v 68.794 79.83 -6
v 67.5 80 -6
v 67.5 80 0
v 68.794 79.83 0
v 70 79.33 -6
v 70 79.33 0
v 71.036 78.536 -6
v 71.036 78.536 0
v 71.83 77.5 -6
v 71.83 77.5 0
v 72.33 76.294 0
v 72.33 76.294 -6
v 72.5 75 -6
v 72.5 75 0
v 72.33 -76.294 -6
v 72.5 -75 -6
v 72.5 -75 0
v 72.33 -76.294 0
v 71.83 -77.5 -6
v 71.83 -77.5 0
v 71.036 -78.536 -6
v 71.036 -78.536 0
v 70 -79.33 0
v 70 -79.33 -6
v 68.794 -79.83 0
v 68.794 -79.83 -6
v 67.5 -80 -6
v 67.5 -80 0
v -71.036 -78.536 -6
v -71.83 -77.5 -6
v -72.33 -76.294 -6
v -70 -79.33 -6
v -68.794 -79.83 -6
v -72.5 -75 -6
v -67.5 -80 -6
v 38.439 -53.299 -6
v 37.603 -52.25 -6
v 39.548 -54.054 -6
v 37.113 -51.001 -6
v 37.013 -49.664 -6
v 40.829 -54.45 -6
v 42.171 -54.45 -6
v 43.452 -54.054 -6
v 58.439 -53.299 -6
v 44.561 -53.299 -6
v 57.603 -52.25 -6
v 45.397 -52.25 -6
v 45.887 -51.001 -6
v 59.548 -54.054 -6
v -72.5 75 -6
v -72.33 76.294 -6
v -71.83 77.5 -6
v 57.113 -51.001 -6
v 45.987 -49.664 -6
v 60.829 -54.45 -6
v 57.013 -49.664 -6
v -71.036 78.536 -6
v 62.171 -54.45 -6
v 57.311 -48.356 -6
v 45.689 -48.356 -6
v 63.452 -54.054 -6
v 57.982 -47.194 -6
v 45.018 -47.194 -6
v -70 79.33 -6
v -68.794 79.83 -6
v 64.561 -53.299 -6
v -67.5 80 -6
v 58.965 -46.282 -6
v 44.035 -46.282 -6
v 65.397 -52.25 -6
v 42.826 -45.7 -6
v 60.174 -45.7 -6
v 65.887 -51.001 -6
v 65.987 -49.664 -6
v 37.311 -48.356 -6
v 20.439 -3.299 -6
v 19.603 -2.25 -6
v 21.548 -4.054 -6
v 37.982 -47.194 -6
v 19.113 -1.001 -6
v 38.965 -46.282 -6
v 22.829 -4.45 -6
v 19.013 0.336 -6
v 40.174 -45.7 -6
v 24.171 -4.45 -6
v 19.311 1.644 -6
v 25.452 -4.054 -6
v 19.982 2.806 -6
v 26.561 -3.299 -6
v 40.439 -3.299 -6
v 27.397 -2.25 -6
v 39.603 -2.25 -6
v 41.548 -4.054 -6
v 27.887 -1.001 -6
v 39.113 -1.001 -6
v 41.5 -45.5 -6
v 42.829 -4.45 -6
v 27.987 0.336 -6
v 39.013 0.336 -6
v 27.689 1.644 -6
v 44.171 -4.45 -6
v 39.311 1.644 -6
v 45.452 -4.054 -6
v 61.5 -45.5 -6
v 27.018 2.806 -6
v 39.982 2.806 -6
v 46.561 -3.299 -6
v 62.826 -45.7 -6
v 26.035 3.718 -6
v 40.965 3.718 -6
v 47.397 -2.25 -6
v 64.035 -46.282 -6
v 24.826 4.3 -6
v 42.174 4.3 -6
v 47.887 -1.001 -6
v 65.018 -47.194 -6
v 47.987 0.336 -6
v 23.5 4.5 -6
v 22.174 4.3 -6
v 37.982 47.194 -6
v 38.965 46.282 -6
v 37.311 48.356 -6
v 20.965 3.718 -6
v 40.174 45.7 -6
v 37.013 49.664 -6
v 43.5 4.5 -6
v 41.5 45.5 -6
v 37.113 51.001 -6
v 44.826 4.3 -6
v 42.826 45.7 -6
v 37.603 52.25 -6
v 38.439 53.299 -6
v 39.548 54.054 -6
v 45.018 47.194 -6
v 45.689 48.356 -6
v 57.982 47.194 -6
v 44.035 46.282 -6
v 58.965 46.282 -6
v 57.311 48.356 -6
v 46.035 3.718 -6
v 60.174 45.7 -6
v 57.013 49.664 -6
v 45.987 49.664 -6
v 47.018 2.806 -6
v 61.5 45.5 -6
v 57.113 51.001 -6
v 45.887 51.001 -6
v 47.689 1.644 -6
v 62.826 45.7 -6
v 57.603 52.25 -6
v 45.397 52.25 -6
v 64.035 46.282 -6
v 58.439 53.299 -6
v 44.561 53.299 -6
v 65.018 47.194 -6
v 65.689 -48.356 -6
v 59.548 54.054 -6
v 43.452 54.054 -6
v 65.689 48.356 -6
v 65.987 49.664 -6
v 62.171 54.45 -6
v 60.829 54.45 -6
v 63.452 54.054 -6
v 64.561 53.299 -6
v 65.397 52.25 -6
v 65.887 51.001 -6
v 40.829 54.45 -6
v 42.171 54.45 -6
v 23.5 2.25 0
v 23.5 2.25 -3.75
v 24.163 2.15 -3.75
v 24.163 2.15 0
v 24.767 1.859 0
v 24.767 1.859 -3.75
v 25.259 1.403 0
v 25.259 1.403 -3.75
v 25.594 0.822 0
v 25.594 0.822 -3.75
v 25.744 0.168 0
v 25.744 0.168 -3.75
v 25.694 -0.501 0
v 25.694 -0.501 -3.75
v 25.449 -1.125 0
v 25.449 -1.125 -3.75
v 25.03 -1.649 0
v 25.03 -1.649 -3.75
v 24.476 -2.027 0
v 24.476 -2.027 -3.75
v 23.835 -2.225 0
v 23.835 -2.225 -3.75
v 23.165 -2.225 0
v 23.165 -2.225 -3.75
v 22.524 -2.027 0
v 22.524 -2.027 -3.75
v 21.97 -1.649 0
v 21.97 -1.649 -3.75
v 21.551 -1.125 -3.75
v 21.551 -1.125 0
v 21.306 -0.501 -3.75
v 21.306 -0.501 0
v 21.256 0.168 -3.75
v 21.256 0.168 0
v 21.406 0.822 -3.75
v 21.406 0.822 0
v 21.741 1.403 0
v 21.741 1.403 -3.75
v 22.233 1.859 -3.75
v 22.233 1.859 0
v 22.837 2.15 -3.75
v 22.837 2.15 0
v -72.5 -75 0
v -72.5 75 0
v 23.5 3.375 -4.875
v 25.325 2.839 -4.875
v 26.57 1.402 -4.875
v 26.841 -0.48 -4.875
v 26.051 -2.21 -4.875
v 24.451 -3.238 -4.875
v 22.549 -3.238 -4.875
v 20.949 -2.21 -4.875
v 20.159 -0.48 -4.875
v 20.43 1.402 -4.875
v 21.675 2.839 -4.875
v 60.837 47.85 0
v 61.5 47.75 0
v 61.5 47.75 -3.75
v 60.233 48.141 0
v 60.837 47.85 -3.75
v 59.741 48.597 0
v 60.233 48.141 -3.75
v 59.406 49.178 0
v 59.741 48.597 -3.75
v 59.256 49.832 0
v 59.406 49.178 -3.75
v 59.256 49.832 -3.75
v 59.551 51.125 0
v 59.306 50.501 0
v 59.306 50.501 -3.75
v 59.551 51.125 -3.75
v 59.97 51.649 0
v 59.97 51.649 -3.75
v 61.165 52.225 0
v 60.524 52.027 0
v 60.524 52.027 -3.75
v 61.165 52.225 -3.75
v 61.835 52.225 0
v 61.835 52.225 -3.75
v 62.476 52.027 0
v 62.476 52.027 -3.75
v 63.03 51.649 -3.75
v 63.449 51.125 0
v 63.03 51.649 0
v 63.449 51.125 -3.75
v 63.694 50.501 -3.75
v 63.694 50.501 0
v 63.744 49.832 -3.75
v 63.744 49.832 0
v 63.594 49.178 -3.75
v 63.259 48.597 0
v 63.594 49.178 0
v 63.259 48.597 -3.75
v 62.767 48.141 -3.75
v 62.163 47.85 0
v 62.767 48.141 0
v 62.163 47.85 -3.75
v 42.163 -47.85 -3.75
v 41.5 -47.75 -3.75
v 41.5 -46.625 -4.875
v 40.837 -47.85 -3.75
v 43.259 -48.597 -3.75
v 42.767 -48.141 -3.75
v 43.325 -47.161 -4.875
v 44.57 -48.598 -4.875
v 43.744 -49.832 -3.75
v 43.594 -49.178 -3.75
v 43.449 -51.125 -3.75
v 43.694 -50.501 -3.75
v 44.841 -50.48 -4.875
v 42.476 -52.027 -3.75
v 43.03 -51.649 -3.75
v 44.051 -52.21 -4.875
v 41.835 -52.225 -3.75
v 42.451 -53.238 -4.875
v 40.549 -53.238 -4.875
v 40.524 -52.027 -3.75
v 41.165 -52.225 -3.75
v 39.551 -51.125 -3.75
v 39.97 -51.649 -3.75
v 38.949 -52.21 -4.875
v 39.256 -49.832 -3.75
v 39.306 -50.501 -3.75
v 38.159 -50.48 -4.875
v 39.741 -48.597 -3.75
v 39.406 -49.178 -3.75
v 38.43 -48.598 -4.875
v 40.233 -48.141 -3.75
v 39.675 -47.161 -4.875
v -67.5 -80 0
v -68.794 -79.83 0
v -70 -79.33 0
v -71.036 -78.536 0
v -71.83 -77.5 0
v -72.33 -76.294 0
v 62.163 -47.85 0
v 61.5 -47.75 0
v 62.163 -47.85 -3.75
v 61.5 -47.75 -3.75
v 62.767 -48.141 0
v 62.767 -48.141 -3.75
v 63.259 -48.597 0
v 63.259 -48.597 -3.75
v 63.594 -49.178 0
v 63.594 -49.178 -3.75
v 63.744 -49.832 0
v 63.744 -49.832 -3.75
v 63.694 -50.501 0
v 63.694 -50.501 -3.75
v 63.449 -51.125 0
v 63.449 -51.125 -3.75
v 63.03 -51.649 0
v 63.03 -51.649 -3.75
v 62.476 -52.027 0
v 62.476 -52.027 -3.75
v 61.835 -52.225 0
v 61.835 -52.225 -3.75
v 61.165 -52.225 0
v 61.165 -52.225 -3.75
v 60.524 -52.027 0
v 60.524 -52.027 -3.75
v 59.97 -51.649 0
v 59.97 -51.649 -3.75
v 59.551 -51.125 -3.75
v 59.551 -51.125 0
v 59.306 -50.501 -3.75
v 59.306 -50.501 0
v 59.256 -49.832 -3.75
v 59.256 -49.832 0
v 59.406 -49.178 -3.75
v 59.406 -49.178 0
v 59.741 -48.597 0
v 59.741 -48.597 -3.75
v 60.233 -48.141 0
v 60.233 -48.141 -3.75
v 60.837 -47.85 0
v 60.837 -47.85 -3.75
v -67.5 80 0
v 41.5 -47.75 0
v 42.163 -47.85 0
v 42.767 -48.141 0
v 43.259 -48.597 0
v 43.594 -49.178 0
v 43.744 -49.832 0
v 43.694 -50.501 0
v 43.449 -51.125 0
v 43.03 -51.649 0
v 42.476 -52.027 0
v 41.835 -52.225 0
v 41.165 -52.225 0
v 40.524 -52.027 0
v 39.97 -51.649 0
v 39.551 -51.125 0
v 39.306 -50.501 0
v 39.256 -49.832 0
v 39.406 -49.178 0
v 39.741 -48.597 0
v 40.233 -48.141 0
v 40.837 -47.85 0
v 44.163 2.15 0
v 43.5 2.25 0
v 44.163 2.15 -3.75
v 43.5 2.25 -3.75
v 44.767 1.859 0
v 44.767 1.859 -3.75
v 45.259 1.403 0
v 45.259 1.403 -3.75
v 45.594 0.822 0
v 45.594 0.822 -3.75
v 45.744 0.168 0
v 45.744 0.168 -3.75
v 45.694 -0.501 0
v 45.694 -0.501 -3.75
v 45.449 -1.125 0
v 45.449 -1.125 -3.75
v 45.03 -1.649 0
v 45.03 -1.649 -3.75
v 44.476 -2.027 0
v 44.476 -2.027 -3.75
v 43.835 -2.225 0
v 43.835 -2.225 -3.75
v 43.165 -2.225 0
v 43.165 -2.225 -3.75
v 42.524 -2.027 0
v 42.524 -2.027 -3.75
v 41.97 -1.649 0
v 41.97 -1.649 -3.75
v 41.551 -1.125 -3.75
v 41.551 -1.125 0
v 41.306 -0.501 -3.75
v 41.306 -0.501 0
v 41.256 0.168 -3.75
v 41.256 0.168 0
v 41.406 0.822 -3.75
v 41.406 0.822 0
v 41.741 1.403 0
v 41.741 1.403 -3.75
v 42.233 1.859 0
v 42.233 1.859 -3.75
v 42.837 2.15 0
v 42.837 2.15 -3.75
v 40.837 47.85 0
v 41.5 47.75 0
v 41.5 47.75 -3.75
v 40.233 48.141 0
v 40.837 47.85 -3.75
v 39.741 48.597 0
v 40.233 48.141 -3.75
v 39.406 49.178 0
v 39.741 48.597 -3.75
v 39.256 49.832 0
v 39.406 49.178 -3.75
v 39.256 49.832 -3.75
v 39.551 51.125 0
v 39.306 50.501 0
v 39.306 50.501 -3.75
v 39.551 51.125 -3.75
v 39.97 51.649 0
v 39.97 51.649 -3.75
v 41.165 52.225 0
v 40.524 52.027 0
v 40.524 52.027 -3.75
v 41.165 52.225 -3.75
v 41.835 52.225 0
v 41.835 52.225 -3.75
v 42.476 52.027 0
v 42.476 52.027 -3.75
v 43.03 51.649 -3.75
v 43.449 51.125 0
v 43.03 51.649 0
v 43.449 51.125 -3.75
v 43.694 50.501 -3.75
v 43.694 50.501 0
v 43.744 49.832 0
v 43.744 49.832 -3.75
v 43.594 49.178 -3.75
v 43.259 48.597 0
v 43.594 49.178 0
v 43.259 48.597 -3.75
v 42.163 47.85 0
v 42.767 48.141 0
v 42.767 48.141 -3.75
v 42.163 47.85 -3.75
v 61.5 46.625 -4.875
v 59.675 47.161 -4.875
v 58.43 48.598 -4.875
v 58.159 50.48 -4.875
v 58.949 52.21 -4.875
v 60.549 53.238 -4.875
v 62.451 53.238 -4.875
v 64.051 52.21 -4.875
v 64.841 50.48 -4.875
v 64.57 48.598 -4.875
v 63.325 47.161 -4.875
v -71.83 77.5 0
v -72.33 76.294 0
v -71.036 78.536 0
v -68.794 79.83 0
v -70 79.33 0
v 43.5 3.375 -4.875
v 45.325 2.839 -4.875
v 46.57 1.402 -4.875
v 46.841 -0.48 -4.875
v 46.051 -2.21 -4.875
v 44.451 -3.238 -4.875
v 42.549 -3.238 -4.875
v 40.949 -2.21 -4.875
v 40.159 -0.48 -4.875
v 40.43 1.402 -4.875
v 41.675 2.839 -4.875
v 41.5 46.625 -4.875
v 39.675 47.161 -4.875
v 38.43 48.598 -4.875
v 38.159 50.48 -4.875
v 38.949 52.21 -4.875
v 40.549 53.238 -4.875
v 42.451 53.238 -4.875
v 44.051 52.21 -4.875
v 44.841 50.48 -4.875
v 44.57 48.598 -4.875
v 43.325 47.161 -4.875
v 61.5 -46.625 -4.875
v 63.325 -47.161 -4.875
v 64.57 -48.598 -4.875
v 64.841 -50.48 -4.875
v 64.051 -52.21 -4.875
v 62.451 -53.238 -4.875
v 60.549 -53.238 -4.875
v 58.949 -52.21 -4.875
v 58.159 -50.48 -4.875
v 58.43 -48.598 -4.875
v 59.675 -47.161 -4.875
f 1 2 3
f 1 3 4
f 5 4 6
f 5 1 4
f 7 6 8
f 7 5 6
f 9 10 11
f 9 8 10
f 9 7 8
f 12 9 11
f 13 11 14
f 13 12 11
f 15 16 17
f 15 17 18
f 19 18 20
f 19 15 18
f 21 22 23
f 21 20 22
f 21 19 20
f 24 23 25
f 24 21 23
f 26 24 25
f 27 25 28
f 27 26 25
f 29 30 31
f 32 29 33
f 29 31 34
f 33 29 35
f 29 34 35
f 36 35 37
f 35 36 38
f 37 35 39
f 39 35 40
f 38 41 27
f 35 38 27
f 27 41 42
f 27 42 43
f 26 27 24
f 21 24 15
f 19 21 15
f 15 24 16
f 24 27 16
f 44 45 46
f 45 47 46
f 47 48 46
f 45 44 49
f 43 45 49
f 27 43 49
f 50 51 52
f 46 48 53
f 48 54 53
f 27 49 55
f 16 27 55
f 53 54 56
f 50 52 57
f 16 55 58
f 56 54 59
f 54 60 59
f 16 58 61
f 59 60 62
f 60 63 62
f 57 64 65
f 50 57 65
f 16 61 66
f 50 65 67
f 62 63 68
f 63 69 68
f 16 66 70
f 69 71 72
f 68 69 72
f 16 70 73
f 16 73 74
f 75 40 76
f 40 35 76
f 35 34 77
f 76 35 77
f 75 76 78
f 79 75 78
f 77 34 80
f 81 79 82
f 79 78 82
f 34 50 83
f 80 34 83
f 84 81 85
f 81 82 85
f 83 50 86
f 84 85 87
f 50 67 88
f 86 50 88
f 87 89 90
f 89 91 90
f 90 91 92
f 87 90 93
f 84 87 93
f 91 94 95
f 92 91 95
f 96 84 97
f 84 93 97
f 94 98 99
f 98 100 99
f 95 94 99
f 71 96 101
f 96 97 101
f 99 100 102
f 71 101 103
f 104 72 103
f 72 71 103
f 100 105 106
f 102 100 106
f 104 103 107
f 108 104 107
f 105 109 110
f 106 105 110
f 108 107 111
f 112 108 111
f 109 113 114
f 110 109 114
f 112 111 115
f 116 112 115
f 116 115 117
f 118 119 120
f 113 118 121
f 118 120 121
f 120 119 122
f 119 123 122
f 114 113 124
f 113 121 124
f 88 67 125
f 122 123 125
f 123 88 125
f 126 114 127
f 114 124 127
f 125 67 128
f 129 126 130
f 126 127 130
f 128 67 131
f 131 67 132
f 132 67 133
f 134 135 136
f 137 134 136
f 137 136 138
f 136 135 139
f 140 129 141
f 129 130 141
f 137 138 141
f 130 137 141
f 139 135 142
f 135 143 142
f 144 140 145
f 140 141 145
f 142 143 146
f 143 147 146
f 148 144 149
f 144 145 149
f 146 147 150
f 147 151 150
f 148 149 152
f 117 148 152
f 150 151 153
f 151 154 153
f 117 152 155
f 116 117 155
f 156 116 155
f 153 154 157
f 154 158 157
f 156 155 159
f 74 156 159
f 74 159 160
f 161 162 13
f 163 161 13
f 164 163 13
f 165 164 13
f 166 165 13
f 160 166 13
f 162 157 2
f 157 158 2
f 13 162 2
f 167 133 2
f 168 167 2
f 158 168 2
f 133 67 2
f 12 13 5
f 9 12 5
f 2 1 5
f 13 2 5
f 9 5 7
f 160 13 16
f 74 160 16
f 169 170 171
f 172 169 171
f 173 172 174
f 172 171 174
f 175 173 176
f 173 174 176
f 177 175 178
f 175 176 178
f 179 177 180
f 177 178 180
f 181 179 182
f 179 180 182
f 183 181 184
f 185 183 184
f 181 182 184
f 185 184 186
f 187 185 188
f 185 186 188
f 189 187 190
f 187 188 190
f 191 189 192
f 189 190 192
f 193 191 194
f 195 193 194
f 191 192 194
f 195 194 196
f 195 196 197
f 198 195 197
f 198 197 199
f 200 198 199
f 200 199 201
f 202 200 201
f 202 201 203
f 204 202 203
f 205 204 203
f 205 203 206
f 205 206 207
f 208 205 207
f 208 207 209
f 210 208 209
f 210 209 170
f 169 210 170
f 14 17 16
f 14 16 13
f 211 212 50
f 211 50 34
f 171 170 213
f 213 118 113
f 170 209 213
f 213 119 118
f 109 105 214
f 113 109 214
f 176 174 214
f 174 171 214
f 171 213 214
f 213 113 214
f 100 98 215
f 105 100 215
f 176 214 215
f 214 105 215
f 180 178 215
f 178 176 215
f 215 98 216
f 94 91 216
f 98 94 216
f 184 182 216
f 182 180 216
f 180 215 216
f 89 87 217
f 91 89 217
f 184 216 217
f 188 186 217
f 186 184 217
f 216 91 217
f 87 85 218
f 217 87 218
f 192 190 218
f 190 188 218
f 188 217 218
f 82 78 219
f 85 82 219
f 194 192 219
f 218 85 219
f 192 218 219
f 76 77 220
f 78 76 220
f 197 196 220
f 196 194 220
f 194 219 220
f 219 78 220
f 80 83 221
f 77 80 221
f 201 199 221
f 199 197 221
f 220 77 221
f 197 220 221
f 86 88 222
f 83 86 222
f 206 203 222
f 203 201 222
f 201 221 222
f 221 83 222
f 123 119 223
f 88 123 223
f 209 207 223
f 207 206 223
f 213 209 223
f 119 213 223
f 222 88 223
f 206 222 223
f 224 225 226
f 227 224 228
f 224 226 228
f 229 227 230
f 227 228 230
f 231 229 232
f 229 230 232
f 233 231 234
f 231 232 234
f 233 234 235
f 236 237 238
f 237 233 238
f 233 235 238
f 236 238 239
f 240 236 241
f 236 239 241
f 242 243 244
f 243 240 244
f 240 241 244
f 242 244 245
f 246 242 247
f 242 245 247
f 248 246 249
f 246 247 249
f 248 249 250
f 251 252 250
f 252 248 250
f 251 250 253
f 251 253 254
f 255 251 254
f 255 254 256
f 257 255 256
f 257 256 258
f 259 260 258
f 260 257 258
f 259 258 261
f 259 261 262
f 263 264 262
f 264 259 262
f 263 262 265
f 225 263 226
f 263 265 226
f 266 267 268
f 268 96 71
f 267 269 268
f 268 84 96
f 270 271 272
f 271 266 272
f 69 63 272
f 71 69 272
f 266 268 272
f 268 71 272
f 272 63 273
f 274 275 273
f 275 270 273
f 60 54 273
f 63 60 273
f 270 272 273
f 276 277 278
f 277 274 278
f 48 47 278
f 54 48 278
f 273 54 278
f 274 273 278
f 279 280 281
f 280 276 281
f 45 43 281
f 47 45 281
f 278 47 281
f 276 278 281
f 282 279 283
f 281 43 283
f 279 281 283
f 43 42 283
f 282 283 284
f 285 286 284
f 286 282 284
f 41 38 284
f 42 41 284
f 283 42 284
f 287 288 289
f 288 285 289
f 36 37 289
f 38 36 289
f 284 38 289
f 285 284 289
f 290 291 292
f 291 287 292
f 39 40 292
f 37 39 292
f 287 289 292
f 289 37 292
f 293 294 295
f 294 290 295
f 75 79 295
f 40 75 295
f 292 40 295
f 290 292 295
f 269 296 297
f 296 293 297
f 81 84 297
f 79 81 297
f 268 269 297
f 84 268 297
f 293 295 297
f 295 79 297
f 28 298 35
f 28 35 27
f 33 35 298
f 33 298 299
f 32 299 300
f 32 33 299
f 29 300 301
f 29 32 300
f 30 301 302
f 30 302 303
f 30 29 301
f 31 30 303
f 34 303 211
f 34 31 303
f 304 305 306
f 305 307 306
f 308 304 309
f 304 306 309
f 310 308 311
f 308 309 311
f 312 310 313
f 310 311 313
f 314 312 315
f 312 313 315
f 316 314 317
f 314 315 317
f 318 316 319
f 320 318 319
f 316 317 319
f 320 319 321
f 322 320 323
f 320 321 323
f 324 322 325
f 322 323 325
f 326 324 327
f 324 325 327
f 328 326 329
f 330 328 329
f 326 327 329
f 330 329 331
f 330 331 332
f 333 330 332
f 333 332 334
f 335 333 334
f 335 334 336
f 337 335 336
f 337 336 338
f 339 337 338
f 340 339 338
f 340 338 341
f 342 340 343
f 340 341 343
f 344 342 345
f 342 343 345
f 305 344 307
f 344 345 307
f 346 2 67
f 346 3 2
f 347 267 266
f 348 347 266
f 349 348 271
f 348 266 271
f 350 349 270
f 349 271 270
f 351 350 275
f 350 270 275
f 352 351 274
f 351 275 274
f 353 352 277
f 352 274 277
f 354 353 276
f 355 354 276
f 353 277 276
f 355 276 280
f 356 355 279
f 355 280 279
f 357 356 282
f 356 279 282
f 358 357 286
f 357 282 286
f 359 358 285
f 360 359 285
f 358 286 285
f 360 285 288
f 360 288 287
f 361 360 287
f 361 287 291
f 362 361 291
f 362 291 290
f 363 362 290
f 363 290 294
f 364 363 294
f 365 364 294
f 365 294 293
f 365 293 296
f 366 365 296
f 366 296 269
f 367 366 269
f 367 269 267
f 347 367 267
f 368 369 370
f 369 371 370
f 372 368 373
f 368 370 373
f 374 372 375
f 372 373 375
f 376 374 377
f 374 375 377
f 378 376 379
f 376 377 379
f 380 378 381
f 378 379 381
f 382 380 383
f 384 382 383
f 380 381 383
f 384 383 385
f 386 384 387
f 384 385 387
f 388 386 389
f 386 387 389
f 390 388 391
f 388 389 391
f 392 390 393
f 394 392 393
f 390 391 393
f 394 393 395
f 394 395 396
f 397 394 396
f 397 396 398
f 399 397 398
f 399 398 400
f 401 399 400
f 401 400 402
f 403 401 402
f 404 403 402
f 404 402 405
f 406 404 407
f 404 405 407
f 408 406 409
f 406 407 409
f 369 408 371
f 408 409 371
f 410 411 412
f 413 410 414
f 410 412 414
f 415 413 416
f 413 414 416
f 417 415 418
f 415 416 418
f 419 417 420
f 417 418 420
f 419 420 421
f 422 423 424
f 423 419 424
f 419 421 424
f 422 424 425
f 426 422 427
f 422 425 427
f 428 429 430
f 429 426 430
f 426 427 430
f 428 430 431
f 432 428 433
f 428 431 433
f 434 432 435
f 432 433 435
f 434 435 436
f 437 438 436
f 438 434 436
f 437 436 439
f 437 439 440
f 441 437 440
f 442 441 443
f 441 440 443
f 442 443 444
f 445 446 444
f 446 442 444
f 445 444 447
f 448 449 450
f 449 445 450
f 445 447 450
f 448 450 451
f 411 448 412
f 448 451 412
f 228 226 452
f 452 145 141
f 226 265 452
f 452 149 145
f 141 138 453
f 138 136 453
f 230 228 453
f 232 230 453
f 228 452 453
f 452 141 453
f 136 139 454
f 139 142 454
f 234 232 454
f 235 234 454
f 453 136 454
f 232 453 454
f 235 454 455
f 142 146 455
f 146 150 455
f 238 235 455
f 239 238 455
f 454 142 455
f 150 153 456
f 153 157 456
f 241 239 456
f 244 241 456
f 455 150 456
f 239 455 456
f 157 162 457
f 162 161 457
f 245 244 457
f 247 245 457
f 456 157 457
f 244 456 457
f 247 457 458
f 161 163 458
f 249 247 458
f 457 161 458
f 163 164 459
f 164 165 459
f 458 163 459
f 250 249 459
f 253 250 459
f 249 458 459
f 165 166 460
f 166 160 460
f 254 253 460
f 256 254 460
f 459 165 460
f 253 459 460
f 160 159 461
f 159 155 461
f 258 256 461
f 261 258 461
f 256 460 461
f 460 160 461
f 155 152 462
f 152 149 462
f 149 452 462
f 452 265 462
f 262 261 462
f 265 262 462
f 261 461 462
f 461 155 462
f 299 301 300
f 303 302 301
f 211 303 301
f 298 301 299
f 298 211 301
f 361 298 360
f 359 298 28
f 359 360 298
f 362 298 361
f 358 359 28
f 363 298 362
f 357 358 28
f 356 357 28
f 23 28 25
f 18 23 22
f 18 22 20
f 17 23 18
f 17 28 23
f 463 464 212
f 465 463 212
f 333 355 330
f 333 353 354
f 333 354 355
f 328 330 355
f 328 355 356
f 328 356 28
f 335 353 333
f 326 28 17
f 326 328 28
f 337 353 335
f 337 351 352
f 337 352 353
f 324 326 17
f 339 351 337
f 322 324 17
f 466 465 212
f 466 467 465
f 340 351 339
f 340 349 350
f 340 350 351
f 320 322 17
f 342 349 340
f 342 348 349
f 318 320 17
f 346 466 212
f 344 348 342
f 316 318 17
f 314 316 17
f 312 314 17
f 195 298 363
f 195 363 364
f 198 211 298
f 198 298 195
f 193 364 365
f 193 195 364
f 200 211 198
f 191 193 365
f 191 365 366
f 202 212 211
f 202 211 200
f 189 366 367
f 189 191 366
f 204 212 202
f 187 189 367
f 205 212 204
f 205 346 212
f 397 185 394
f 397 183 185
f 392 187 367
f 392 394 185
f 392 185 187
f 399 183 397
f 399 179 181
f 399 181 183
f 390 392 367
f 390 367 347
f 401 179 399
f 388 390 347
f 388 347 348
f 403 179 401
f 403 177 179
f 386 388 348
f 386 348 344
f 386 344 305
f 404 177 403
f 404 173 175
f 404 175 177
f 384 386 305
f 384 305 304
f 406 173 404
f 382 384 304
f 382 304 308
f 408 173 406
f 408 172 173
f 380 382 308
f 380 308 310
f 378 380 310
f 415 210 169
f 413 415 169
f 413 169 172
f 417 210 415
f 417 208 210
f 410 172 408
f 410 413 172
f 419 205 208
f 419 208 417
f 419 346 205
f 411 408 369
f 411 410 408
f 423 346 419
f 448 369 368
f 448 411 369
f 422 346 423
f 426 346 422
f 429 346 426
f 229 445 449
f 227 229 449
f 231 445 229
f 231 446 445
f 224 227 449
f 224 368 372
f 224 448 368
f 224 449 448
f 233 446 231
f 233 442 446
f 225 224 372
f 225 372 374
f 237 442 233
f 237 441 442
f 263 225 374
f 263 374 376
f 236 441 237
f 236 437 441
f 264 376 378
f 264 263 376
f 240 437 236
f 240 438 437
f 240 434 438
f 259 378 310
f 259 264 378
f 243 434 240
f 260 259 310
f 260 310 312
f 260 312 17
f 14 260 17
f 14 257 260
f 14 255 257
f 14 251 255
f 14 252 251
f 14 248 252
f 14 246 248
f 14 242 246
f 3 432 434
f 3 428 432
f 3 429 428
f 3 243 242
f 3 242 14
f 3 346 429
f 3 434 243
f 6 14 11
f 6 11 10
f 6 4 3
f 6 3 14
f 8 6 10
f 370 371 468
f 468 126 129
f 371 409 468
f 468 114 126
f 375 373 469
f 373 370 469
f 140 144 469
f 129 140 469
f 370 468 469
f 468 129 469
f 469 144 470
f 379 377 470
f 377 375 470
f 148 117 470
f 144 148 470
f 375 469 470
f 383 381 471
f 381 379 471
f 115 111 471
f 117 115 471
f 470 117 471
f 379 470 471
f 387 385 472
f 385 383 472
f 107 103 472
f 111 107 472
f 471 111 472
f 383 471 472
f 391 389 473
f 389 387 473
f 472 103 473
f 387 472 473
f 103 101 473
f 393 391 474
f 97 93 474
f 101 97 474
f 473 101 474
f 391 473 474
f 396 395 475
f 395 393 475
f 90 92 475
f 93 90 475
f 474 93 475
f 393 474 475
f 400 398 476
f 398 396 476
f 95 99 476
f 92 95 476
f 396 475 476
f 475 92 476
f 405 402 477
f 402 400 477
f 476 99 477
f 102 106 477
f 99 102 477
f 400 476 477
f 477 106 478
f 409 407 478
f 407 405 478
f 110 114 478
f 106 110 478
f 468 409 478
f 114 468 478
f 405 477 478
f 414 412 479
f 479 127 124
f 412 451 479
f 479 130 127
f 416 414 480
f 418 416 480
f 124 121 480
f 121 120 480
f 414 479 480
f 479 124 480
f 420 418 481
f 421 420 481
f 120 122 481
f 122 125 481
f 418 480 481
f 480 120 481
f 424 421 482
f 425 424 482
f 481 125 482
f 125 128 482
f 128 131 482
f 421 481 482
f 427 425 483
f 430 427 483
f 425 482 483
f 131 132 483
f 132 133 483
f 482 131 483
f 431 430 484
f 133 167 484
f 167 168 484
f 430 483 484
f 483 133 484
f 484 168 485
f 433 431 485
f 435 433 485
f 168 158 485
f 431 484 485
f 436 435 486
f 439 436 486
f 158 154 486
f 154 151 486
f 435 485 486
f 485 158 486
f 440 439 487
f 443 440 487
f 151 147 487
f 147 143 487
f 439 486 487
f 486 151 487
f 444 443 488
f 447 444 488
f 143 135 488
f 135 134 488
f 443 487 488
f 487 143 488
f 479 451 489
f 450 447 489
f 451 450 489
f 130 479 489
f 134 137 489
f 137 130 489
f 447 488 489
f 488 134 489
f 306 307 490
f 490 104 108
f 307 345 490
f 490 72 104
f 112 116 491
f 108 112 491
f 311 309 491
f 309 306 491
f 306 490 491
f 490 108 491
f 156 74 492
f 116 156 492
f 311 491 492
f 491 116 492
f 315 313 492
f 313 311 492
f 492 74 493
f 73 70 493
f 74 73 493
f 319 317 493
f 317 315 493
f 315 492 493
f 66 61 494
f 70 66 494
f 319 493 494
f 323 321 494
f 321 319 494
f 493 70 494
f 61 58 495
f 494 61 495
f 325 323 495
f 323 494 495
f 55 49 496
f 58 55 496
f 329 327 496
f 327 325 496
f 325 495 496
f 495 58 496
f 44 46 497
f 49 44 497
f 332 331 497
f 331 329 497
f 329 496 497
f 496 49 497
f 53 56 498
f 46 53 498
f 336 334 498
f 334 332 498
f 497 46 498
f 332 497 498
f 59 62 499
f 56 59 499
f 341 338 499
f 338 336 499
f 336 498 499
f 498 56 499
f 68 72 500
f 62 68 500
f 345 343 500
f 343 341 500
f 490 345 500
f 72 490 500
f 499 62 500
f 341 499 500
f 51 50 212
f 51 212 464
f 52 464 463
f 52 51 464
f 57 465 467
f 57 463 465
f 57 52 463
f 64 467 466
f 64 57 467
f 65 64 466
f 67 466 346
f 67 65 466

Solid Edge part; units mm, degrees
sketch "Sketch1" plane through (60.3162, 60.3162, 0) normal (0, 0, 1) x (1, 0, 0)
  line L0 (-132.8162, -140.3162) -> (12.1838, -140.3162)
  line L1 (12.1838, -140.3162) -> (12.1838, 19.6838)
  line L2 (12.1838, 19.6838) -> (-132.8162, 19.6838)
  line L3 (-132.8162, 19.6838) -> (-132.8162, -140.3162)
  dimension "D1" = 145
  dimension "D2" = 160
extrude "Protrusion1" add sketch "Sketch1" against normal blind 6
fillet "Verrundung_1" radius 5 4 edges at (-72.5, 80, -3) (72.5, 80, -3) (72.5, -80, -3) (-72.5, -80, -3)
hole "Bohrung_3" at (43.5, 0, -6) direction (0, 0, 1) diameter 4.5 end up to next countersink diameter 9 countersink angle 90
hole "Hole1" at (23.5, 0, -6) direction (0, 0, 1) diameter 4.5 end up to next countersink diameter 9 countersink angle 90
hole "Bohrung_5" at (61.5, -50, -6) direction (0, 0, 1) diameter 4.5 end up to next countersink diameter 9 countersink angle 90
hole "Hole2" at (41.5, -50, -6) direction (0, 0, 1) diameter 4.5 end up to next countersink diameter 9 countersink angle 90
mirror "Mirror1" about plane through (9.6062, 0, 9.6062) normal (0, -1, 0) of "Bohrung_5", "Hole2"
properties material "Aluminium, 1060"
